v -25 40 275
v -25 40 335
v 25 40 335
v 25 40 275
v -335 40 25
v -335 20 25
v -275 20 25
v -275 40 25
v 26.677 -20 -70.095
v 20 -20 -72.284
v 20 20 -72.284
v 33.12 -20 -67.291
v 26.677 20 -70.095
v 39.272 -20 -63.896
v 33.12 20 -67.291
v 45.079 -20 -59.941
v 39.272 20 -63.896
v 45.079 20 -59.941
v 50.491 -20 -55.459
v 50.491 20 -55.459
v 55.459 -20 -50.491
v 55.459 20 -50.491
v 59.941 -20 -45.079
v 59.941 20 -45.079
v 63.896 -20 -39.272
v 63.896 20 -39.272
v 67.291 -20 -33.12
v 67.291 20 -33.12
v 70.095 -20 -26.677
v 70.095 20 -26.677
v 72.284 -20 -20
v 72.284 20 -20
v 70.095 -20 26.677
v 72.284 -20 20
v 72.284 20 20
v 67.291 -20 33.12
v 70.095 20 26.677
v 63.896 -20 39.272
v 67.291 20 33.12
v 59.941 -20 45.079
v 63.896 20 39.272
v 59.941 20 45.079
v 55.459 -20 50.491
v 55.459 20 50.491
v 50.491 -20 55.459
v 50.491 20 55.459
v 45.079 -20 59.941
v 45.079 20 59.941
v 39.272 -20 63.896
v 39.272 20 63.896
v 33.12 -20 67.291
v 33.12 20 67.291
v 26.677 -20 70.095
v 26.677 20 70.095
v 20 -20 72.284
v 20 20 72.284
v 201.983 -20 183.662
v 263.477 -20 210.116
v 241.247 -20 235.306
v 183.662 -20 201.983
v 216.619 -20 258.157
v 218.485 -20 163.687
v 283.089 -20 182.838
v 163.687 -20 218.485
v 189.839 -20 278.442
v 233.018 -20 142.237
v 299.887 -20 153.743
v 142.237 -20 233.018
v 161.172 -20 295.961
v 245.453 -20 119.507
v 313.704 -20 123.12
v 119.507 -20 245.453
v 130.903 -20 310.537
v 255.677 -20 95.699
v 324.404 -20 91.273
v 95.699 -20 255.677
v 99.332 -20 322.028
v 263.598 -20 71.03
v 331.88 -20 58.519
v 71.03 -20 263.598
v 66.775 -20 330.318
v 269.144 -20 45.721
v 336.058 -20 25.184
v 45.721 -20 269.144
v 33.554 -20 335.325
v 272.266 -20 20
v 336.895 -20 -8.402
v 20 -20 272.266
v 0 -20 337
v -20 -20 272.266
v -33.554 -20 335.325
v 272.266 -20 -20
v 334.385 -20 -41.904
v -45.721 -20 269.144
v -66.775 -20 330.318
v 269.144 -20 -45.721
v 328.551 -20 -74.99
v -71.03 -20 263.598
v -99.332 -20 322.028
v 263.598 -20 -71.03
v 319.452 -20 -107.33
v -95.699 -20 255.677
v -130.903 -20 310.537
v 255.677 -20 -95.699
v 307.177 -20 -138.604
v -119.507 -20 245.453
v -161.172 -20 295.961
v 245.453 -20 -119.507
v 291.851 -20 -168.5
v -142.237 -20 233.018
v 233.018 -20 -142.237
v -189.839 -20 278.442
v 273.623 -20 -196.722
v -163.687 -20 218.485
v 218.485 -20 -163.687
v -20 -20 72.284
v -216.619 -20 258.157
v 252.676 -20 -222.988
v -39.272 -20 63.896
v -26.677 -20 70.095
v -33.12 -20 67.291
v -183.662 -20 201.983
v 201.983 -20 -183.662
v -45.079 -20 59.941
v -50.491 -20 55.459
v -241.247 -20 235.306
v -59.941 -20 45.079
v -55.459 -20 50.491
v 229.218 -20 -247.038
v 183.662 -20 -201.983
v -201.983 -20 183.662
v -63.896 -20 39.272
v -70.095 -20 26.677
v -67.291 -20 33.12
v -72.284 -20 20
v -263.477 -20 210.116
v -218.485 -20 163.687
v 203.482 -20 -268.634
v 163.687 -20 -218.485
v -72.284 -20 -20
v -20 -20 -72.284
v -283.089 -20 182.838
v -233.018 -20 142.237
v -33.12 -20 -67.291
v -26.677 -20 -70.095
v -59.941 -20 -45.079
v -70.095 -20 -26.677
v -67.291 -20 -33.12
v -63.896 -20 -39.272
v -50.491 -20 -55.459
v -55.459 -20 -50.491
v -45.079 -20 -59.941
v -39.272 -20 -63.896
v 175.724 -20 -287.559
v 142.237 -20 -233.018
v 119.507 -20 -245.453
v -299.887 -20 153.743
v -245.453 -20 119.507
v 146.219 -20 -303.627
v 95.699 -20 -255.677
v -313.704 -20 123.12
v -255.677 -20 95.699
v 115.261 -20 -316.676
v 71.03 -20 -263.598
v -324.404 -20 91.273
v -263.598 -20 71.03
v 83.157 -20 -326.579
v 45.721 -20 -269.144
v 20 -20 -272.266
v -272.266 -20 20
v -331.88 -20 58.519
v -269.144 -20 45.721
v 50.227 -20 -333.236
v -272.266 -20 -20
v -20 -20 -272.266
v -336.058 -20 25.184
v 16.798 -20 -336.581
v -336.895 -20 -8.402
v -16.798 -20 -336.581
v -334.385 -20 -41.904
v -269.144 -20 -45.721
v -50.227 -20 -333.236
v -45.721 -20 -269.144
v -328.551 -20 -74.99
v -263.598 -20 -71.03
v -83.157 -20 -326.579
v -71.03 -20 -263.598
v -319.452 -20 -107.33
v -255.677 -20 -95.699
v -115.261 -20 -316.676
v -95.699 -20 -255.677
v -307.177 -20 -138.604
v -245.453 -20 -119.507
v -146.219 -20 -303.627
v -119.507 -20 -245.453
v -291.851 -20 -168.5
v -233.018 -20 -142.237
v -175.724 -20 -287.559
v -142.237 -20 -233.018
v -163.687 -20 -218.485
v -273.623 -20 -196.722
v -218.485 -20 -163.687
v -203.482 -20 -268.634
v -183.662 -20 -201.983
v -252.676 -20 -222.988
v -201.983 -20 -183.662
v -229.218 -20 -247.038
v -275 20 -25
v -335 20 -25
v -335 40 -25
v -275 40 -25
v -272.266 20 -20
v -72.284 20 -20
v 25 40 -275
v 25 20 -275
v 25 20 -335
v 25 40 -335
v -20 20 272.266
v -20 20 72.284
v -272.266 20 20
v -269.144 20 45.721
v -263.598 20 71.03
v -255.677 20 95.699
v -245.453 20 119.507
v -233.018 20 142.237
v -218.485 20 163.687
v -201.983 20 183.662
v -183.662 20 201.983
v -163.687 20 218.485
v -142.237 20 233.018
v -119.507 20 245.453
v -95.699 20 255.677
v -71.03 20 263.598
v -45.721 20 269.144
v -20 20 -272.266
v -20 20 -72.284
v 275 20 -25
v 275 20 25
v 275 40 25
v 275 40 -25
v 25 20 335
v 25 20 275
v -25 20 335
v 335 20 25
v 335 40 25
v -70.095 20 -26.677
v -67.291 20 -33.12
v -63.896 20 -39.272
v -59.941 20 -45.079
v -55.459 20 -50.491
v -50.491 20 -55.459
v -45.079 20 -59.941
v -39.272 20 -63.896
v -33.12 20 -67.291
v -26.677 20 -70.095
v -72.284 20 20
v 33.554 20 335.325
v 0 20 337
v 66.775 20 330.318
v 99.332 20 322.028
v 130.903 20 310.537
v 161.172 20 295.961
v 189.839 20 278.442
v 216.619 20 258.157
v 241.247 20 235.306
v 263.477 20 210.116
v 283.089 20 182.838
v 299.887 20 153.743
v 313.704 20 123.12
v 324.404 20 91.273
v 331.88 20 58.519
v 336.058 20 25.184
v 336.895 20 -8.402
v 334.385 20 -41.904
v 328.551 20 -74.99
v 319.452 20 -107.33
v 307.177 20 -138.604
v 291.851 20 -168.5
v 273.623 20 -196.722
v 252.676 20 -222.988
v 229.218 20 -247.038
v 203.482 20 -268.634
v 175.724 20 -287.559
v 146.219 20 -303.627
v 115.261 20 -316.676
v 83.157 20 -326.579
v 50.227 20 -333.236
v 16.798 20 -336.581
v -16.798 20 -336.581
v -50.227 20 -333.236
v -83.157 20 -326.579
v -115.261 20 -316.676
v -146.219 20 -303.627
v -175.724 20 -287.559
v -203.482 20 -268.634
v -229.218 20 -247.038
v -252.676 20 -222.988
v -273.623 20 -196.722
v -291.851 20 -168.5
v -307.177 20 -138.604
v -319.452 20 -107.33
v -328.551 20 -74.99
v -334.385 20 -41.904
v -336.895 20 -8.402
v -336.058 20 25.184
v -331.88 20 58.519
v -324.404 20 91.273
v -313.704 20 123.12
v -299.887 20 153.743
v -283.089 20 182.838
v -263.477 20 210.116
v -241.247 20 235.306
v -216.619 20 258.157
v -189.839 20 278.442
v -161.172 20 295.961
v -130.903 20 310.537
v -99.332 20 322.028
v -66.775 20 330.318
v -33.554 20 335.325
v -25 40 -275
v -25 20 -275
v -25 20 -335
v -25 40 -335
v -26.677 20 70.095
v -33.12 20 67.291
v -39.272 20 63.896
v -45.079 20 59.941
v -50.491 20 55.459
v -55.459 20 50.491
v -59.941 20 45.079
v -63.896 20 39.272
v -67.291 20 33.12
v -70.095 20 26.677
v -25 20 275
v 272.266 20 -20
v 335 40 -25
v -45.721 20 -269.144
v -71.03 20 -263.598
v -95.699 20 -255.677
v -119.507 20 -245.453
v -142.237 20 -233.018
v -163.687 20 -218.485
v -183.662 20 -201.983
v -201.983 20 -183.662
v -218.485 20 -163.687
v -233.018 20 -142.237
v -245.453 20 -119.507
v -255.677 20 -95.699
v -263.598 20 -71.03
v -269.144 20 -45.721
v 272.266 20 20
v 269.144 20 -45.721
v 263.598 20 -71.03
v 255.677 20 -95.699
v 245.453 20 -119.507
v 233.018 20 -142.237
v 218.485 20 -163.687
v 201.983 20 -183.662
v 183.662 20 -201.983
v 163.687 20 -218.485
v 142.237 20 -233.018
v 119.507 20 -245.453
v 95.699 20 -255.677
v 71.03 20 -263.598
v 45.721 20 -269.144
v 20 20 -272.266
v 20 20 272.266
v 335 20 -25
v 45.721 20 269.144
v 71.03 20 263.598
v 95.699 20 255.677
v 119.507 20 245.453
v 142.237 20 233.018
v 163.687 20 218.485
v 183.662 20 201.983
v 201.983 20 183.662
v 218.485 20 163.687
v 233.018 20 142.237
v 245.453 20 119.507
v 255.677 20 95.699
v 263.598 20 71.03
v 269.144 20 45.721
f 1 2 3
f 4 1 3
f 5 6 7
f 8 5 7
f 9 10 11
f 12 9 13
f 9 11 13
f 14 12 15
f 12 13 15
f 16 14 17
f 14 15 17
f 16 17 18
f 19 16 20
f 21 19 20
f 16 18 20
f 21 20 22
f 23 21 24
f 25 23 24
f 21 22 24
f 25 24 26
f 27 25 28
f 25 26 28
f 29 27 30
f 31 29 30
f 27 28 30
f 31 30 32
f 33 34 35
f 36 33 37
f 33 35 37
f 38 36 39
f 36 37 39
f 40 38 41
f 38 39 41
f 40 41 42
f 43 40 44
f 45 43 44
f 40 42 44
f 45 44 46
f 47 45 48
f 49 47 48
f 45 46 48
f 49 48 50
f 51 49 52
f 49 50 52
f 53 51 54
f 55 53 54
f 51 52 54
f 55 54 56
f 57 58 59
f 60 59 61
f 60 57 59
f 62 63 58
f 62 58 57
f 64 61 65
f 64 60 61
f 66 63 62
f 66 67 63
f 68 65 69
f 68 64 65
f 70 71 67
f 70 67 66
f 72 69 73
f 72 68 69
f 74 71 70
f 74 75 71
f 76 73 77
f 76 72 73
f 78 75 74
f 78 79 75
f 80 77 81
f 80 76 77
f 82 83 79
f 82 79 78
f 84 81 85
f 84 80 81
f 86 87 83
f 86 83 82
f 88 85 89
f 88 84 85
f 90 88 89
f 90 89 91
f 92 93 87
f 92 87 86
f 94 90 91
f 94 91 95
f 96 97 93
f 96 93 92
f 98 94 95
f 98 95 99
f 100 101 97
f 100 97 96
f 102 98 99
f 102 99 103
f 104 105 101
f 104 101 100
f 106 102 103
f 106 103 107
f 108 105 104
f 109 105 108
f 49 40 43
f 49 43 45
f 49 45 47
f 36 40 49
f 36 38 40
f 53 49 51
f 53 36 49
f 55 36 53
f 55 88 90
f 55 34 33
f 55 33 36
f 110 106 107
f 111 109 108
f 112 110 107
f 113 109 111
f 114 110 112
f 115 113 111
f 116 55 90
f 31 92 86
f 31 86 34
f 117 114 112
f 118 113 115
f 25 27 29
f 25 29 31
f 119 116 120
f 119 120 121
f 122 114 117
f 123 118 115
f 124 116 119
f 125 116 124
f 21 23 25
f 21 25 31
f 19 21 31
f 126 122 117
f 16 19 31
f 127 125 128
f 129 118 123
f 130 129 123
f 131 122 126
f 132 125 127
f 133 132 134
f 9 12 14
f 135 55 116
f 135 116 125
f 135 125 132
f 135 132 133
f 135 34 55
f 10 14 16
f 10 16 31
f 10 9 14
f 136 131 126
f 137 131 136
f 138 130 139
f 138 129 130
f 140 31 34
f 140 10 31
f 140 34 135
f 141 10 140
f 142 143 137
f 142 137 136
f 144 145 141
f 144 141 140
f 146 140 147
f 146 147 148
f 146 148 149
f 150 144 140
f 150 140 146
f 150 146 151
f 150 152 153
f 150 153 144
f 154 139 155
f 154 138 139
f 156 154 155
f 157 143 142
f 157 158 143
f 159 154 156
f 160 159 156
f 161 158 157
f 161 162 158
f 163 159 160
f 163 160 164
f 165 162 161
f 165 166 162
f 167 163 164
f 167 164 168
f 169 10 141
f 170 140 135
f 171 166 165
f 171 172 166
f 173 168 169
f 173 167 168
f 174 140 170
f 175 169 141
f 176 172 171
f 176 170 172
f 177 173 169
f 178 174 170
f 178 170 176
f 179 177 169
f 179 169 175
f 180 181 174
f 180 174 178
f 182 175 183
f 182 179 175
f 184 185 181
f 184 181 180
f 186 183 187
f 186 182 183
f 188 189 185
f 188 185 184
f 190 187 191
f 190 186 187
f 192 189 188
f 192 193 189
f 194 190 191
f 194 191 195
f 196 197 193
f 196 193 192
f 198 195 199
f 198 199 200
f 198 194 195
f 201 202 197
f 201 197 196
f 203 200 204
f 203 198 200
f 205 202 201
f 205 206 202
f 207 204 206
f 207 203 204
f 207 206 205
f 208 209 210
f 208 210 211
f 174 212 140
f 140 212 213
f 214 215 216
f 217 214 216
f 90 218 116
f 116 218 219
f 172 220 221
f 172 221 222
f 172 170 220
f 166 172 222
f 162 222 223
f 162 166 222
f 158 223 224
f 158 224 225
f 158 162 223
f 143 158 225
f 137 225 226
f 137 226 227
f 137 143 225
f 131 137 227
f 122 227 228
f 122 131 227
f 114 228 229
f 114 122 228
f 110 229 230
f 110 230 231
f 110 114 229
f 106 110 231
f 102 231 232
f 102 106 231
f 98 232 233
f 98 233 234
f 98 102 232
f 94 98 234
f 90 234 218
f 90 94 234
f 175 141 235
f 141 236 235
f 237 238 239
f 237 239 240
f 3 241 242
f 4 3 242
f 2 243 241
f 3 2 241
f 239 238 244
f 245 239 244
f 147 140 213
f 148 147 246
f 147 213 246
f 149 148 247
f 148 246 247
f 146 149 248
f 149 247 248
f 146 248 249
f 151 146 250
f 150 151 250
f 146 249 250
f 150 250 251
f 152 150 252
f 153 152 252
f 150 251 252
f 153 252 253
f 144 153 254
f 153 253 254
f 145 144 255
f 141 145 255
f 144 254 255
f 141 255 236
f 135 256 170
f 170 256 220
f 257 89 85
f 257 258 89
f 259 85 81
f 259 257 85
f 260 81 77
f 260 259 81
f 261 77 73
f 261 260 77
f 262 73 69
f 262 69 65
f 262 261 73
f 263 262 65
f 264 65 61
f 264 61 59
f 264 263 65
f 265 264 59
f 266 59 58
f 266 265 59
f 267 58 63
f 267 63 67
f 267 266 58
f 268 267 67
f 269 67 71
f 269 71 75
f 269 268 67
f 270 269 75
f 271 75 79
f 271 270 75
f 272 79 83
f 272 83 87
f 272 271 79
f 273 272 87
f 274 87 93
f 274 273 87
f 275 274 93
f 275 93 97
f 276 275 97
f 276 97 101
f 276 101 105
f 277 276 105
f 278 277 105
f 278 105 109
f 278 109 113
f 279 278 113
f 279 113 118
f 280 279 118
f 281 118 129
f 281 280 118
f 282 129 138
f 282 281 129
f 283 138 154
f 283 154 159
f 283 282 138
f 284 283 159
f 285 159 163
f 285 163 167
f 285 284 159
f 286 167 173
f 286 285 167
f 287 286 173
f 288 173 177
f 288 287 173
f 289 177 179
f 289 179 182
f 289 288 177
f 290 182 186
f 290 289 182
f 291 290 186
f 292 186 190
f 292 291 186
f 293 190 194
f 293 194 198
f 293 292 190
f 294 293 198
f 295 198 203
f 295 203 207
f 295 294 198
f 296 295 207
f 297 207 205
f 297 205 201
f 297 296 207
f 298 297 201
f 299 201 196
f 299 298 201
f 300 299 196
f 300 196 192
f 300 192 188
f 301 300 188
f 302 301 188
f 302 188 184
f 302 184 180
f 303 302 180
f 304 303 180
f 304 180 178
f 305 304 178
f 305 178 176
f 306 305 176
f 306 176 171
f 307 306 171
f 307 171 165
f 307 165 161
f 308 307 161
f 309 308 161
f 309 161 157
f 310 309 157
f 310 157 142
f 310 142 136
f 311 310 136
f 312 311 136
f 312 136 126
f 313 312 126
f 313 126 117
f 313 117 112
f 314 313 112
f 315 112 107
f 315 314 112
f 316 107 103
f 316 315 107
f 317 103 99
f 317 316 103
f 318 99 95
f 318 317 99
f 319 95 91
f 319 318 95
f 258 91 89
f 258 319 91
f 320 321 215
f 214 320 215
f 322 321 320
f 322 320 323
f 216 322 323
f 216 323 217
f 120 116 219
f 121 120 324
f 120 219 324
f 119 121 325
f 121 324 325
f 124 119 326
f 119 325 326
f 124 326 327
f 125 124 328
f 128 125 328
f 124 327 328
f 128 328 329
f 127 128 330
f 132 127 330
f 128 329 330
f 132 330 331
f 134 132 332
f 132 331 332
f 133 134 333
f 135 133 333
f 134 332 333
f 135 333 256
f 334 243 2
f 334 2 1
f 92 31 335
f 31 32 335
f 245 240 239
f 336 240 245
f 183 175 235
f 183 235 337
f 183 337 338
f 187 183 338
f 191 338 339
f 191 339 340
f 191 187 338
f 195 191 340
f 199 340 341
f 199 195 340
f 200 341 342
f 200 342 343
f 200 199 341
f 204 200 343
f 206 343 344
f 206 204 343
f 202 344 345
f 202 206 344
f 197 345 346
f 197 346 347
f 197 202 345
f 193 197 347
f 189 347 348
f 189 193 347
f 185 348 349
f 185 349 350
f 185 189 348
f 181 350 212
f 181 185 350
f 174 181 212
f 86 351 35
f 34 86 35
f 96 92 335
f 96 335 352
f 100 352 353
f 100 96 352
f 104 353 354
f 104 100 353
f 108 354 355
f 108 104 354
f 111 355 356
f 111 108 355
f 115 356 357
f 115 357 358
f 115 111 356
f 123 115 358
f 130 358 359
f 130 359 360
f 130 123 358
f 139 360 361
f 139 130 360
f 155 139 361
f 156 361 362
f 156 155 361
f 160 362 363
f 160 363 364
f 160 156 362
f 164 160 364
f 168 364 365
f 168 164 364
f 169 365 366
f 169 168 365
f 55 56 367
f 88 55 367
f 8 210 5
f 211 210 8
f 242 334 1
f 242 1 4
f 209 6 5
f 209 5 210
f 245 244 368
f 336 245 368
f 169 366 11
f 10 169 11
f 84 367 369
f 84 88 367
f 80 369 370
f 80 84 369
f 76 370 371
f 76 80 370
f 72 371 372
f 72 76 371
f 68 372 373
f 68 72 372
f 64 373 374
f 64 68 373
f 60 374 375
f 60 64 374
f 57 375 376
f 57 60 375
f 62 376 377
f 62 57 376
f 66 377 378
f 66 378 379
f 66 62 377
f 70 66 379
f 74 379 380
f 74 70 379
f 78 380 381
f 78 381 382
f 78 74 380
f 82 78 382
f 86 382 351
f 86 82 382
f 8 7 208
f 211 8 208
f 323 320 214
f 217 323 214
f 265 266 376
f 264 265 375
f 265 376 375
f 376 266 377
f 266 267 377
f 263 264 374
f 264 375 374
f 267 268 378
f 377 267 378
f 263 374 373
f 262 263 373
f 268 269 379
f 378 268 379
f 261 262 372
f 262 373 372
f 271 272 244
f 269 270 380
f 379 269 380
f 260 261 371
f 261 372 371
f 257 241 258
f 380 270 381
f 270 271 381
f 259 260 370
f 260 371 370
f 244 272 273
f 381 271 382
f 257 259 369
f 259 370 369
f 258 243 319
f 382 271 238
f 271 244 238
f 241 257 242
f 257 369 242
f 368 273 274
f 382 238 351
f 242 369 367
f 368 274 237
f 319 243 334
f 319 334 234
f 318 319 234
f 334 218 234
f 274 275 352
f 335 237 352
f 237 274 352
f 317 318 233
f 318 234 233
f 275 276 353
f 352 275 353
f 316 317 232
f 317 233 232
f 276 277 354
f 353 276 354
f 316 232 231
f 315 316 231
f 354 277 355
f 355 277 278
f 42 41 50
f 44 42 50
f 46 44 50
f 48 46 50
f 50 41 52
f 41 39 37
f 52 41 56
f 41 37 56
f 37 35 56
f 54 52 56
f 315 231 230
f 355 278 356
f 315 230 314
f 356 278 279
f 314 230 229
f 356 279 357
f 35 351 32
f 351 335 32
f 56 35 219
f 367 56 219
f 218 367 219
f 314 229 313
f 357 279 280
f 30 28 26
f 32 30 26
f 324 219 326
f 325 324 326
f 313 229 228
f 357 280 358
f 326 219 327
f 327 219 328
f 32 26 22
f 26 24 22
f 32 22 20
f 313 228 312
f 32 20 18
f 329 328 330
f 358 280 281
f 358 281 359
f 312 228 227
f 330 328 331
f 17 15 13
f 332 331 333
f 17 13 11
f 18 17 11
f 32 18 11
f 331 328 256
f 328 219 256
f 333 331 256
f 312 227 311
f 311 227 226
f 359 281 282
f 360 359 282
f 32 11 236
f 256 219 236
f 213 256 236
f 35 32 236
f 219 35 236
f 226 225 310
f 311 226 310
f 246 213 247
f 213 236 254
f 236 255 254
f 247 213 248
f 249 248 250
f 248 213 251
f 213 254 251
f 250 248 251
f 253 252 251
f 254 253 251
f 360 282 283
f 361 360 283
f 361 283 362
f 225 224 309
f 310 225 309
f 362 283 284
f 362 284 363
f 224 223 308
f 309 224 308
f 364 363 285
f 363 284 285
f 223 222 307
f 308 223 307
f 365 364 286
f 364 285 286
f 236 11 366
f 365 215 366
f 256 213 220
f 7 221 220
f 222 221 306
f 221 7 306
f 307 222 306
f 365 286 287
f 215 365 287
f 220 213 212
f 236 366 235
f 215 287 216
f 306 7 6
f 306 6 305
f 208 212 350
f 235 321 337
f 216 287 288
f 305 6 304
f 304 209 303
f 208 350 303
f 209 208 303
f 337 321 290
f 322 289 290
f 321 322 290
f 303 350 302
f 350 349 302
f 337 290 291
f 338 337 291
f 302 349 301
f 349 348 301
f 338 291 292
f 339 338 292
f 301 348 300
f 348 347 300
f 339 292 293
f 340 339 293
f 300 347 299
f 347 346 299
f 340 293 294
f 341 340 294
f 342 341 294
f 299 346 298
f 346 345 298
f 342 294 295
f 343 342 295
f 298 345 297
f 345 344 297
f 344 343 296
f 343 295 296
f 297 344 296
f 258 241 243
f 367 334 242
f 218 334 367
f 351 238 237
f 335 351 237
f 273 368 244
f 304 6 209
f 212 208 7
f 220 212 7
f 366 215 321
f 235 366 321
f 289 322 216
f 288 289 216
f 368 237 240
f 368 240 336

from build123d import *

# Parameters (mm, degrees)
SKETCH2_R           = 20
SKETCH3_W           = 40
SKETCH3_H           = 40
BOSS_EXTRUDE1_DEPTH = 225
CIRPATTERN1_COUNT   = 4
SKETCH8_R           = 337
SKETCH8_R_2         = 273
BOSS_EXTRUDE3_DEPTH = 20
BOSS_EXTRUDE4_DEPTH = 20
SKETCH12_W          = 60
SKETCH12_H          = 50
SKETCH12_W_2        = 50
SKETCH12_H_2        = 60
BOSS_EXTRUDE5_DEPTH = 20


with BuildPart() as part:
    # Sketch2 → Revolve1 (revolve)
    with BuildSketch(Plane.XY, mode=Mode.PRIVATE) as revolve1_sk:
        with Locations((300, 0)):
            Circle(SKETCH2_R)
    revolve(revolve1_sk.sketch.rotate(Axis((0, 0, 0), (0, 1, 0)), 90), axis=Axis((0, 0, 0), (0, 1, 0)))

    # Sketch3 → Boss-Extrude1 (add)
    with BuildSketch(Plane.XY.offset(300)):
        Rectangle(SKETCH3_W, SKETCH3_H)
    boss_extrude1 = extrude(amount=-BOSS_EXTRUDE1_DEPTH)

    # CirPattern1: Boss-Extrude1 ×4 about axis
    cirpattern1_axis = Axis((0, 0, 0), (0, 1, 0))
    for i in range(1, CIRPATTERN1_COUNT):
        add(boss_extrude1.rotate(cirpattern1_axis, i * 360 / CIRPATTERN1_COUNT))

    # Sketch8 → Boss-Extrude3 (add, symmetric)
    with BuildSketch(Plane(origin=(0, 0, 0), x_dir=(1, 0, 0), z_dir=(0, 1, 0))):
        with Locations(Location((0, 0, 0), (0, 0, 270))):
            Circle(SKETCH8_R)
        Circle(SKETCH8_R_2, mode=Mode.SUBTRACT)
    extrude(amount=BOSS_EXTRUDE3_DEPTH, both=True)

    # Sketch9 → Boss-Extrude4 (add, symmetric)
    with BuildSketch(Plane(origin=(0, 0, 0), x_dir=(1, 0, 0), z_dir=(0, 1, 0))):
        with BuildLine():
            Line((-20, -75), (-20, -72.284161474))
            ThreePointArc((-20, -72.284161474), (-53.033008589, -53.033008589), (-72.284161474, -20))
            Line((-72.284161474, -20), (-75, -20))
            Line((-75, -20), (-75, 20))
            Line((-75, 20), (-72.284161474, 20))
            ThreePointArc((-72.284161474, 20), (-53.033008589, 53.033008589), (-20, 72.284161474))
            Line((-20, 72.284161474), (-20, 75))
            Line((-20, 75), (20, 75))
            Line((20, 75), (20, 72.284161474))
            ThreePointArc((20, 72.284161474), (53.033008589, 53.033008589), (72.284161474, 20))
            Line((72.284161474, 20), (75, 20))
            Line((75, 20), (75, -20))
            Line((75, -20), (72.284161474, -20))
            ThreePointArc((72.284161474, -20), (53.033008589, -53.033008589), (20, -72.284161474))
            Line((20, -72.284161474), (20, -75))
            Line((20, -75), (-20, -75))
        make_face()
    extrude(amount=BOSS_EXTRUDE4_DEPTH, both=True)

    # Sketch12 → Boss-Extrude5 (add)
    with BuildSketch(Plane(origin=(0, 20, 0), x_dir=(1, 0, 0), z_dir=(0, 1, 0))):
        with Locations((305, 0)):
            Rectangle(SKETCH12_W, SKETCH12_H)
        with Locations((0, -305)):
            Rectangle(SKETCH12_W_2, SKETCH12_H_2)
        with Locations((-305, 0)):
            Rectangle(SKETCH12_W, SKETCH12_H)
        with Locations((0, 305)):
            Rectangle(SKETCH12_W_2, SKETCH12_H_2)
    extrude(amount=BOSS_EXTRUDE5_DEPTH)


solid = part.part
